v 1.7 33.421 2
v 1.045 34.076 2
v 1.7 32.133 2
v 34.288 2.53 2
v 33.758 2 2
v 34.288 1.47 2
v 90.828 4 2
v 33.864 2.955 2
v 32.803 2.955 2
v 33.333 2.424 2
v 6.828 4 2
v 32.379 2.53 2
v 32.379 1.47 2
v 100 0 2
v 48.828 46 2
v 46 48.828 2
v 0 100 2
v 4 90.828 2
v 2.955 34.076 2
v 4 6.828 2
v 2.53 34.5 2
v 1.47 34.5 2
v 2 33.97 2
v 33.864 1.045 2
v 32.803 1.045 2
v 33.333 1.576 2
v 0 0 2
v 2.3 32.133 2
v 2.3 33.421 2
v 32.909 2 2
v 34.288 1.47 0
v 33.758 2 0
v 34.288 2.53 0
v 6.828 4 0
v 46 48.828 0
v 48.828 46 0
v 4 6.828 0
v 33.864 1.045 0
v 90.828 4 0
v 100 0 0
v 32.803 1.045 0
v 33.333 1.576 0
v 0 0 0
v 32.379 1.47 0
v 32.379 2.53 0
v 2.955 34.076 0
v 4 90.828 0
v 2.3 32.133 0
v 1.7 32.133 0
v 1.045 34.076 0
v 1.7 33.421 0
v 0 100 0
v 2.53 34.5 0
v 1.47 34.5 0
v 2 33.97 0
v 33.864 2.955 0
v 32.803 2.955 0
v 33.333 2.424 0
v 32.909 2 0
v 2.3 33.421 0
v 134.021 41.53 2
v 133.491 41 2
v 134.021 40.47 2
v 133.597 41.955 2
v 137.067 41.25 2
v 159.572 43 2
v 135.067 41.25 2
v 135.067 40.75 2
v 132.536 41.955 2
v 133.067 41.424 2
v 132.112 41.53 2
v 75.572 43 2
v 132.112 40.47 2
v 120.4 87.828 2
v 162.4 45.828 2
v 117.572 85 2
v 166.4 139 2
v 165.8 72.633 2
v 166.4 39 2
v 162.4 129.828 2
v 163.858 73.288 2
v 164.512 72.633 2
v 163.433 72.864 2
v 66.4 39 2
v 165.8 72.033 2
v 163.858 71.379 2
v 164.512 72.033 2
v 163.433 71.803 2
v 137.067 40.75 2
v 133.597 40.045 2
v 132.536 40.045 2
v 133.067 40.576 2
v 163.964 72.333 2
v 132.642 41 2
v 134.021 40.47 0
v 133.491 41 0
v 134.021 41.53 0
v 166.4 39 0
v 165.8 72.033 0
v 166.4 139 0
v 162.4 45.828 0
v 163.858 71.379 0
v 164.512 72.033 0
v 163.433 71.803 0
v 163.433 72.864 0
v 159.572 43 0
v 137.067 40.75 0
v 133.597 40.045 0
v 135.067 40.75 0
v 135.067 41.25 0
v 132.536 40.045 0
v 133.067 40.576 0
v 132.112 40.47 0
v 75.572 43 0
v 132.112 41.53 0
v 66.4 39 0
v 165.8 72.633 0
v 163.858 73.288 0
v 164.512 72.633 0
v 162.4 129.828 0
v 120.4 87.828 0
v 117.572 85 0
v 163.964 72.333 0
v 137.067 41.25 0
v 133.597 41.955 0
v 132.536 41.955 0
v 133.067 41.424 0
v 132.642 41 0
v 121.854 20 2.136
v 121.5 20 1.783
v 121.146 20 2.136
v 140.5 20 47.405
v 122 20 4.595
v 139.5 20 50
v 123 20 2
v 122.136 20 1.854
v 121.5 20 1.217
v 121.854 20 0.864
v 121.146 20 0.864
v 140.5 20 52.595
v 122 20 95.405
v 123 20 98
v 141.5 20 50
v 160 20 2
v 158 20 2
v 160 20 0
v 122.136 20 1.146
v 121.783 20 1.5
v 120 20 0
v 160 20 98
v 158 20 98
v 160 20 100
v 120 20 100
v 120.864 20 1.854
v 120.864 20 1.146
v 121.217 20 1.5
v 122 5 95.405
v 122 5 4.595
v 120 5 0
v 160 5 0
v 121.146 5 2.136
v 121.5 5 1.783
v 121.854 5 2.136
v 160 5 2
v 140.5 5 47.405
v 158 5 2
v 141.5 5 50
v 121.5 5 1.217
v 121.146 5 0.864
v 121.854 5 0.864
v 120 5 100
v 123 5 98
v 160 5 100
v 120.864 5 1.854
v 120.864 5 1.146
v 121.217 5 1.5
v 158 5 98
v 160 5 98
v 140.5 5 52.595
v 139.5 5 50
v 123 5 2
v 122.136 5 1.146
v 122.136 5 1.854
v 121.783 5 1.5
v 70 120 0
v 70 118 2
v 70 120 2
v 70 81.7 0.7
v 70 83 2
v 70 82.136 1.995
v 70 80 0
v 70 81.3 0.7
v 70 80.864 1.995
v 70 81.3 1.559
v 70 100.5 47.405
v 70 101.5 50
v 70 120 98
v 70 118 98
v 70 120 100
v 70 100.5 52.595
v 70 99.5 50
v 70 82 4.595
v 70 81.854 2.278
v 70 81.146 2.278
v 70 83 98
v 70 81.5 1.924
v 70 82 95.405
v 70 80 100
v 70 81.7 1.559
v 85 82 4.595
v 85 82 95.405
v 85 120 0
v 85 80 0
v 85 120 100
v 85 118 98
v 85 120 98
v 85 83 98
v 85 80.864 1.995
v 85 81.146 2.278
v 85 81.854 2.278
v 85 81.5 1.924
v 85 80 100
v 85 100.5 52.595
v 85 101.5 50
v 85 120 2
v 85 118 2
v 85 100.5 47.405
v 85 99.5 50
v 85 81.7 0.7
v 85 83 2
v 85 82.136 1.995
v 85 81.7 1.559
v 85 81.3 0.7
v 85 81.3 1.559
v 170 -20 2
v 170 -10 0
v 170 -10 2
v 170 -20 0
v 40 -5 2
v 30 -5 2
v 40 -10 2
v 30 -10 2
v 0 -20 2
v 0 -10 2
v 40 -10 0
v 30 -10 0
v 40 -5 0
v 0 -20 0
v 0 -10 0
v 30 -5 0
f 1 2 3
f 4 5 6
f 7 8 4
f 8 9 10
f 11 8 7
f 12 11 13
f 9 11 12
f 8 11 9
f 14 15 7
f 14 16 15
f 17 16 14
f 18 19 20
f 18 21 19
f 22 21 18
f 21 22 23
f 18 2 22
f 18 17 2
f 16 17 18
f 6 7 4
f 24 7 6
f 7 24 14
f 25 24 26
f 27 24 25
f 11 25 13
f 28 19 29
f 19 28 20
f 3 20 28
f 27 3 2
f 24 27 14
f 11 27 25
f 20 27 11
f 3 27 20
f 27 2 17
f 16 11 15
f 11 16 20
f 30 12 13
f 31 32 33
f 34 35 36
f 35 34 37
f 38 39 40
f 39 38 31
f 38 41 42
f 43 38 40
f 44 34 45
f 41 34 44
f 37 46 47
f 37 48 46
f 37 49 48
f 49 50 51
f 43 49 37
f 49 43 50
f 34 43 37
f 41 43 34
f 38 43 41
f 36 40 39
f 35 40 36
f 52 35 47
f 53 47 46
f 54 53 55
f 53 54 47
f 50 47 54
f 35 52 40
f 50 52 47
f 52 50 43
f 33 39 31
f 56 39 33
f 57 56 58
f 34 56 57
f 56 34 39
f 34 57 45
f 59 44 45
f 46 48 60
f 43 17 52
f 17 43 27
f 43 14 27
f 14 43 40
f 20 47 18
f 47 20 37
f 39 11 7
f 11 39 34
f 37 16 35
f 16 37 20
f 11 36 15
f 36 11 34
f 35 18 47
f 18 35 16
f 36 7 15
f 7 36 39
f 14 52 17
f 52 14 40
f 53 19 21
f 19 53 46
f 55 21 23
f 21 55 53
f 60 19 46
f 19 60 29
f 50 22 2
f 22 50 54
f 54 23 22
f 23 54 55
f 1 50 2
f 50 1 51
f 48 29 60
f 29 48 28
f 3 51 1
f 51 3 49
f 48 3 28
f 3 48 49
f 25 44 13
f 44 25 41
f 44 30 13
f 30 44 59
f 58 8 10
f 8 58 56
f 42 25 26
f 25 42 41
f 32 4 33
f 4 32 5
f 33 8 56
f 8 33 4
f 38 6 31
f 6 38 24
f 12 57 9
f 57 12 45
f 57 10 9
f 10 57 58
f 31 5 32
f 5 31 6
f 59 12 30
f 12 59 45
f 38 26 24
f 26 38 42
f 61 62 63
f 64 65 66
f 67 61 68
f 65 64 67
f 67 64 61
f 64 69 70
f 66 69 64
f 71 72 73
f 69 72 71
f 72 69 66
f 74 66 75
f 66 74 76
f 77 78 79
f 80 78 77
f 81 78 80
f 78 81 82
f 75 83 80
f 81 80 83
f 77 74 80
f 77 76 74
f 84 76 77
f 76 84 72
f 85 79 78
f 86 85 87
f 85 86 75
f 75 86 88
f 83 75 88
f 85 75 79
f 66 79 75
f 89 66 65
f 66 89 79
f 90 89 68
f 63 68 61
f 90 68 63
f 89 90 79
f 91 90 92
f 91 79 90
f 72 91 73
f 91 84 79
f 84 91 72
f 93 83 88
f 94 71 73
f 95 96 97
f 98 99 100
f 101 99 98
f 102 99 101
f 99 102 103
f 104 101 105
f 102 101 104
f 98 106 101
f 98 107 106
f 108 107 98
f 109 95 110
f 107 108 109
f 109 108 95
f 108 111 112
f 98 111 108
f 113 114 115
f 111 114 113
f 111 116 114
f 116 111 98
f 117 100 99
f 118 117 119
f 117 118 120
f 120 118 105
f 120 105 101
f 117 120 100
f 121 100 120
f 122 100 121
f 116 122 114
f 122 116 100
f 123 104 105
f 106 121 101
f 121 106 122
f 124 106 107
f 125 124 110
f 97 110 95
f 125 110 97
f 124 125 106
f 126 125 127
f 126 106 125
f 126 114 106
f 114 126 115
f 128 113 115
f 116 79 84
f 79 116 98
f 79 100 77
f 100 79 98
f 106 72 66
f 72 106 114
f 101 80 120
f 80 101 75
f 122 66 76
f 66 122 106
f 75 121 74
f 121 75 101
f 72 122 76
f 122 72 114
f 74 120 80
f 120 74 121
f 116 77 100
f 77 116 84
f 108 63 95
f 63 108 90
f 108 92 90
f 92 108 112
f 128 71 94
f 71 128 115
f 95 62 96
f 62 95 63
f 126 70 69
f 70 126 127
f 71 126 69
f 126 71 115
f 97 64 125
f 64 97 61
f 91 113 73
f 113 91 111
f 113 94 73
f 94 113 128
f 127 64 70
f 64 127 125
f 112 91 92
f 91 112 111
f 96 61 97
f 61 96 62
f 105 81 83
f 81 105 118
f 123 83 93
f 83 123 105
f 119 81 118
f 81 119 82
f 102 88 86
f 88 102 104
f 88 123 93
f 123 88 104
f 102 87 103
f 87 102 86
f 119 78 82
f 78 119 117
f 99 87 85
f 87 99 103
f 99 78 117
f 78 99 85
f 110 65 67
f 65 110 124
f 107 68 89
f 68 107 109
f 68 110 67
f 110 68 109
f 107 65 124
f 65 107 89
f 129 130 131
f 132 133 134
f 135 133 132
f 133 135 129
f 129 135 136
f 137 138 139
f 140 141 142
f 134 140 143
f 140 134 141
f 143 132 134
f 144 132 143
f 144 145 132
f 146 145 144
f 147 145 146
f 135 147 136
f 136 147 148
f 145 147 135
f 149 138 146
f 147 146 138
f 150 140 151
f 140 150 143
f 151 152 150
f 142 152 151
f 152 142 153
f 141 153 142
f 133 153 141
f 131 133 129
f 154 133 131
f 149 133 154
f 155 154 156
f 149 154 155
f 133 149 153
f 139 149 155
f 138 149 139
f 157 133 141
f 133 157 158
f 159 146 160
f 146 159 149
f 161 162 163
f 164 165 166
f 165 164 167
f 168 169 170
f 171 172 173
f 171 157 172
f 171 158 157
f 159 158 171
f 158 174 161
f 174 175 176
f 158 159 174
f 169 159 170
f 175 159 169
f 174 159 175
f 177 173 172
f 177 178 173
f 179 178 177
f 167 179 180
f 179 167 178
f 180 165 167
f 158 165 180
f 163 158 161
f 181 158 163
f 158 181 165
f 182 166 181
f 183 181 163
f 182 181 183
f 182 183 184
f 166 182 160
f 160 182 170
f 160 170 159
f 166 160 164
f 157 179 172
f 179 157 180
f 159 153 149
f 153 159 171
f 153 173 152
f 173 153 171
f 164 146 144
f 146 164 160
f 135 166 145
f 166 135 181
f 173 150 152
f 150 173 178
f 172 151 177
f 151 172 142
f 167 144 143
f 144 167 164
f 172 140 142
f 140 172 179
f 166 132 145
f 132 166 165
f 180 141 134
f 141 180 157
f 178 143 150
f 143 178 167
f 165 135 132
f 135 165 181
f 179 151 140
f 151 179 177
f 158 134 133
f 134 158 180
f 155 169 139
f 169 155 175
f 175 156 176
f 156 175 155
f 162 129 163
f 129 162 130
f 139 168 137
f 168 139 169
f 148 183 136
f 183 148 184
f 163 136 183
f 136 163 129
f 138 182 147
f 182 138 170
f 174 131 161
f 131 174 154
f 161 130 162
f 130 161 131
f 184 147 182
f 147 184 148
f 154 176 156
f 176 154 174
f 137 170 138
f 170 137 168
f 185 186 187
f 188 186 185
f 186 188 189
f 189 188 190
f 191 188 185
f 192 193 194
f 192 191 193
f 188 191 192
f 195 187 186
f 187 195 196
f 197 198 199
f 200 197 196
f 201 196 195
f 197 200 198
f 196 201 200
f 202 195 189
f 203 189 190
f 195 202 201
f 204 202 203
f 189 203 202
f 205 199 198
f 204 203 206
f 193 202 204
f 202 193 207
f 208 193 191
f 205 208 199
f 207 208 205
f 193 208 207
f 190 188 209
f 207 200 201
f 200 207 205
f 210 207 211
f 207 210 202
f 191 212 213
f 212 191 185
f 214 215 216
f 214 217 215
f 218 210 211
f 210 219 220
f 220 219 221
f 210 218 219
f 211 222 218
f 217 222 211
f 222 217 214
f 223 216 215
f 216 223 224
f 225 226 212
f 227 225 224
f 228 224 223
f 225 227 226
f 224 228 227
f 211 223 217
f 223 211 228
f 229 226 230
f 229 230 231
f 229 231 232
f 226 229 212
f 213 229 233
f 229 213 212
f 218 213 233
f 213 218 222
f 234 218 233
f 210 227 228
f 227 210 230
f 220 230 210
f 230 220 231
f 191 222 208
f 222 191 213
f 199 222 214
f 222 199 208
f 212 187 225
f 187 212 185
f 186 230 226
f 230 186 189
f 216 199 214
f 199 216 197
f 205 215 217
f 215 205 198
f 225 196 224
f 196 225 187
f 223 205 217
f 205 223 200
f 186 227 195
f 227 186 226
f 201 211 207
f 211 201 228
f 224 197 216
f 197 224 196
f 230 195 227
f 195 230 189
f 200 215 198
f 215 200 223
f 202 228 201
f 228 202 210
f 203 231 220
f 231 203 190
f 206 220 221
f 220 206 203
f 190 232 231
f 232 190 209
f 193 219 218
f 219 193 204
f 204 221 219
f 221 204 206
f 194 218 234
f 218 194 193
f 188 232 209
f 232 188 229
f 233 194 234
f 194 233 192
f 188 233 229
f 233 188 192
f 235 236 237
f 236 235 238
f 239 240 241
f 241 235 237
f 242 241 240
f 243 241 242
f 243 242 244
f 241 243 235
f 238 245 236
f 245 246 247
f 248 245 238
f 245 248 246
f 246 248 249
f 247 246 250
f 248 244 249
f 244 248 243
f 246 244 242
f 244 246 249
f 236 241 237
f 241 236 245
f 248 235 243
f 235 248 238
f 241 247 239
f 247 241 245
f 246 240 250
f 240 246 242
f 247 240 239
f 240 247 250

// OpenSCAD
size = 100;
h = 2;
w = 4;
//fontLine = 1;
sqrt2 = sqrt(2);
epsilon = 0.01;
module triang()
{
    intersection()
    {
        union()
        {
            difference()
            {
                cube([size, size, h]);
                translate([w,w,0]) cube([size - 2 * w, size - 2 * w, h + epsilon]);
            }
            translate([w/2/sqrt2,-w/2/sqrt2,0]) rotate([0,0,45])  cube([size * sqrt2, w, h]);
            translate([size + w/2/sqrt2,w/2/sqrt2,0]) rotate([0,0,180-45])  cube([size * sqrt2, w * sqrt2, h]);
        }
        difference()
        {
            cube([size, size, h]);
            translate([size, 0,0]) rotate([0,0,45]) cube([300,300,h]);
        }
    }
}
module xSign()
{
    union()
    {
        rotate([0,0,45]) translate([0,0,h/2]) cube([3.5,1,h], center = true);
        rotate([0,0,-45]) translate([0,0,h/2]) cube([3.5,1,h], center = true);
    }
}
module ySign()
{
    translate([1/2/sqrt2,0,0]) rotate([0,0,45]) cube([3.5/2,1,h]);
    translate([1/2/sqrt2,1/sqrt2,0])rotate([0,0,135]) cube([3.5/2,1,h]);
    translate([-0.5,-2, 0]) cube([1,3,h]);
}


// first triangle
module firstTri()
{
    difference()
    {
        triang();
        translate([2, size/3, 0])scale([0.6,0.6,1]) ySign();
        translate([size/3, 2, 0]) scale([0.6,0.6,1]) xSign();
    }
}
// second triangle
module secondTri()
{
    translate([1.6 * (size + w),0.35*size+w,0])  rotate([0,0,90]) difference()
    {
        triang();
        translate([1.75, size/3 - 4, 0]) cube([0.5,2,h]);
        translate([2, size/3, 0])scale([0.6,0.6,1]) xSign();
        translate([size/3, 1.8, 0]) scale([0.6,0.6,1]) ySign();

    }
}

module skewFinder()
{
    a = 100;
    b = 40;
    fw = 2;
    linear_extrude(15) polygon([[0,0],[0,a],[fw,a],[fw,0]]);
    linear_extrude(15) polygon([[0,0],[b,0],[b,fw],[0,fw]]);
    linear_extrude(15) polygon([[0,a],[b,a],[b,a-fw],[0,a-fw]]);
    linear_extrude(15) polygon([[b,fw],[1.5*fw, a-fw],[0.5*fw, a-fw],[b-fw,fw]]);
    linear_extrude(15) polygon([[b,a-fw],[1.5*fw, fw],[0.5*fw, fw],[b-fw,a-fw]]); 
        
}

module xzSkrewFinder()
{
    rotate([90, 0,0]) difference()
    {
        skewFinder();
        translate([1.5,1.5,0]) scale([0.4,0.4, 20]) xSign();
    }
}

module yzSkrewFinder()
{
    rotate([90, 0,90]) difference()
    {
        skewFinder();
        translate([1.5,1.5,0]) scale([0.4,0.4, 20]) ySign();
    }
}

module stopper()
{
    translate([0, -20, 0]) cube([170, 10, 2]);
    translate([30, -15, 0]) cube([10, 10, 2]);
}

module main()
{
    firstTri();
    secondTri();
    translate([120, 20, 0]) xzSkrewFinder();
    translate([70, 80, 0]) yzSkrewFinder();
    stopper();
}

main();
    
